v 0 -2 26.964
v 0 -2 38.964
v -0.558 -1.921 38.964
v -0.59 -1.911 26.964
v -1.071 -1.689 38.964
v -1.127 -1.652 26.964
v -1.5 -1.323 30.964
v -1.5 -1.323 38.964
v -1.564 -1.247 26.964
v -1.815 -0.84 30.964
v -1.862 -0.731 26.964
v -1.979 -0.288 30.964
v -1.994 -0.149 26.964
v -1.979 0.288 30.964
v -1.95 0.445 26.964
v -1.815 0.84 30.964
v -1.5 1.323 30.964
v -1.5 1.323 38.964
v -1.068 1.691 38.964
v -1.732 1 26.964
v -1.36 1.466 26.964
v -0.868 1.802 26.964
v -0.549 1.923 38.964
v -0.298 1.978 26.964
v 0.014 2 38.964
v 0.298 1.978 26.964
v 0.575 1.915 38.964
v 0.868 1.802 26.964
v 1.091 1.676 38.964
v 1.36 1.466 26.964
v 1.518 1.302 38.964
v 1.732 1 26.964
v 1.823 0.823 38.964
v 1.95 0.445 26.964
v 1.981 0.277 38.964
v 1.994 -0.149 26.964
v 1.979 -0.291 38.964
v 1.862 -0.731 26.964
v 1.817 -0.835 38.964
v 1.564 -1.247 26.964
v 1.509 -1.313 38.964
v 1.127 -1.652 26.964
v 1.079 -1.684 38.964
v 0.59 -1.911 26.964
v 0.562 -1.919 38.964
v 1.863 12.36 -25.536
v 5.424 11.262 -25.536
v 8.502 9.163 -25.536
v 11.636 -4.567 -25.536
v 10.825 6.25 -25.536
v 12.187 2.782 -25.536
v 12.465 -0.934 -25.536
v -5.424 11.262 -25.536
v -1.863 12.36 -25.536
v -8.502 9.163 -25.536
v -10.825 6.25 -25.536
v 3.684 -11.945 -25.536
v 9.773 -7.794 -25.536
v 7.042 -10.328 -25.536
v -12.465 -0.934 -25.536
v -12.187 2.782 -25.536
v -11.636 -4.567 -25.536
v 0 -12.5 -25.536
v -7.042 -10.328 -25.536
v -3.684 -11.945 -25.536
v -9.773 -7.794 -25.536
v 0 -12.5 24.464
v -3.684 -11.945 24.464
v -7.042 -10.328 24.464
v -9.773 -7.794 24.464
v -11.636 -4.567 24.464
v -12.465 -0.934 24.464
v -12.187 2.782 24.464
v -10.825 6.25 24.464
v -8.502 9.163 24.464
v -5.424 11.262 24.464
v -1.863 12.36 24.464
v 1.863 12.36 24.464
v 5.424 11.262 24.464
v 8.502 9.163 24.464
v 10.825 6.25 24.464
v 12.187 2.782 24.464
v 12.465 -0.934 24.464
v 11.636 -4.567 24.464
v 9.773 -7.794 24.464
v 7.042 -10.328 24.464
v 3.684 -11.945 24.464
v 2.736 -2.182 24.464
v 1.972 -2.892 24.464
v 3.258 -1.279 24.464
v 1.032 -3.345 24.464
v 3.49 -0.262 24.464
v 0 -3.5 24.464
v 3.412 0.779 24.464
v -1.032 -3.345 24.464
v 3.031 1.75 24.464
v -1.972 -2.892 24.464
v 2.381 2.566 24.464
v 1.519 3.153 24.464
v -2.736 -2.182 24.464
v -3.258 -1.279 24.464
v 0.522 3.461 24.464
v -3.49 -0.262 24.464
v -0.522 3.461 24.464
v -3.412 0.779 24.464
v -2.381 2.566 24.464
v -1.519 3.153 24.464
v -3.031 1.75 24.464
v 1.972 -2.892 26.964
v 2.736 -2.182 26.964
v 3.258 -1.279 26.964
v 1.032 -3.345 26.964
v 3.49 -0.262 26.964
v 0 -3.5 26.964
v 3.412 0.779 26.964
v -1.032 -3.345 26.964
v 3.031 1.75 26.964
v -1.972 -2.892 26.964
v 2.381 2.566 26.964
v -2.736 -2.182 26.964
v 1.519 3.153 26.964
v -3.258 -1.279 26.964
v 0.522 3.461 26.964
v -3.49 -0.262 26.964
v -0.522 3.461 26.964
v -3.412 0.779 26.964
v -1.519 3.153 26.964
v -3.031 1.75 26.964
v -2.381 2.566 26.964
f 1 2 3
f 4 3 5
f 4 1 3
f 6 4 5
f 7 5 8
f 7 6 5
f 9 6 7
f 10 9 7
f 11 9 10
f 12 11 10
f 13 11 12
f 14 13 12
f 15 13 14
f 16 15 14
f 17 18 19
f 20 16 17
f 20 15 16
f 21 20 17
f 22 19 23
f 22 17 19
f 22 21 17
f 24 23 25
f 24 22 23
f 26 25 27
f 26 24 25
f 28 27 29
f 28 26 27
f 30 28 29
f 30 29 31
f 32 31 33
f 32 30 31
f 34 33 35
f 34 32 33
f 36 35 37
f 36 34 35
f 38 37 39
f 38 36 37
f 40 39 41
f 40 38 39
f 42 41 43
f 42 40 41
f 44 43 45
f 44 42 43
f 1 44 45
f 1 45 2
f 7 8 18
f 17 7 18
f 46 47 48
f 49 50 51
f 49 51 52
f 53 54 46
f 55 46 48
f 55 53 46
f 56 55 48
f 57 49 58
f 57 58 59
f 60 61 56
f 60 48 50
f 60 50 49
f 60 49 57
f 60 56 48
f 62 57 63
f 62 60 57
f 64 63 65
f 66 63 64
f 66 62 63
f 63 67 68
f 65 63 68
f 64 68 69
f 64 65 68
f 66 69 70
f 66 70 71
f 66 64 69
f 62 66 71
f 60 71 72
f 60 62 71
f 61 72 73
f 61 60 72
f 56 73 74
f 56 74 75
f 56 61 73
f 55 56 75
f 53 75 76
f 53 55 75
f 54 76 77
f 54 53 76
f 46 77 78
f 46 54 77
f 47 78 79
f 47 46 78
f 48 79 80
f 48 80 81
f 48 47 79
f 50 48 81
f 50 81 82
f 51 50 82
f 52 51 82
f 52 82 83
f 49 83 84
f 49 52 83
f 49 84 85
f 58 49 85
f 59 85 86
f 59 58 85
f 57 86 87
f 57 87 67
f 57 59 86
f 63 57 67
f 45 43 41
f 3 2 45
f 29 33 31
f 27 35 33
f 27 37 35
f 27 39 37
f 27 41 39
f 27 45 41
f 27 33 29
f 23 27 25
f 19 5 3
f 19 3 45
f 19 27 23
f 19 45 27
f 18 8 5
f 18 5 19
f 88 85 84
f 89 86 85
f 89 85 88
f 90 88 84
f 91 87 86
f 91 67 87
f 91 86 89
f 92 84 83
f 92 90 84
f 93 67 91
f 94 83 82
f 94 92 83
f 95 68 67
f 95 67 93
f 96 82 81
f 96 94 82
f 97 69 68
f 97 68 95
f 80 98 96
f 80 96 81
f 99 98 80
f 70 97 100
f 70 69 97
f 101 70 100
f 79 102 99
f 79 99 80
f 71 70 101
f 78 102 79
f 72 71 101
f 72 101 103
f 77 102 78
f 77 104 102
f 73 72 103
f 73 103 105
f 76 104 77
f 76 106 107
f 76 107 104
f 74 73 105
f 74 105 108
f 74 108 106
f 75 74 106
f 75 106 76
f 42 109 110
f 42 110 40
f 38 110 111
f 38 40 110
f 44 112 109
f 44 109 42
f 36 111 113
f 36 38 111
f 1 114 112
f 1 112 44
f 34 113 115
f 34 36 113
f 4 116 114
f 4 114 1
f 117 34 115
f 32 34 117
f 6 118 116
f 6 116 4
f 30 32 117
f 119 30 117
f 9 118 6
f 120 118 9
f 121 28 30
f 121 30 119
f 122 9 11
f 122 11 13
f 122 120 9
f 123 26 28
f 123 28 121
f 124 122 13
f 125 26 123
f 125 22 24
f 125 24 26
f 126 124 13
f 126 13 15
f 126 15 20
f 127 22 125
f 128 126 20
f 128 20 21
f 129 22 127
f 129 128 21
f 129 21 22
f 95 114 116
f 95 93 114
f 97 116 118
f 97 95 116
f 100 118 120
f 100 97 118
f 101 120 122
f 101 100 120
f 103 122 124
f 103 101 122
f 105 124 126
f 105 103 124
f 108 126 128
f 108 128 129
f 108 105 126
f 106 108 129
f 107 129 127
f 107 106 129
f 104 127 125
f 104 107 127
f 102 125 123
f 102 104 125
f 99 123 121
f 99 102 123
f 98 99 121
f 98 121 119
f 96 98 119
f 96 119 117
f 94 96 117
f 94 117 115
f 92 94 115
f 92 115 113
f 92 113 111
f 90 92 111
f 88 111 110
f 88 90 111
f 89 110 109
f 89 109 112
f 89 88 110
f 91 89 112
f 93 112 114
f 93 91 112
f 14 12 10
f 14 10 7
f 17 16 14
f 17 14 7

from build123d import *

# Parameters (mm, degrees)
F3_DEPTH = 8


with BuildPart() as f1:
    # F0 (on Right) → F1 (revolve)
    with BuildSketch(Plane.YZ):
        Polygon((-12.5, -25.536002), (0, -25.536002), (0, 38.963998), (-2, 38.963998), (-2, 26.963998), (-3.5, 26.963998), (-3.5, 24.463998), (-12.5, 24.463998), align=None)
    revolve(axis=Axis((0, 0, 6.713998), (0, 0, -1)))

    # F2 (on face) → F3 (cut)
    with BuildSketch(Plane.XY.offset(38.963998)):
        with BuildLine():
            Line((-1.5, -1.322876), (-1.5, 1.322876))
            ThreePointArc((-1.5, 1.322876), (-2, 0), (-1.5, -1.322876))
        make_face()
    extrude(amount=-F3_DEPTH, mode=Mode.SUBTRACT)


solid = f1.part
